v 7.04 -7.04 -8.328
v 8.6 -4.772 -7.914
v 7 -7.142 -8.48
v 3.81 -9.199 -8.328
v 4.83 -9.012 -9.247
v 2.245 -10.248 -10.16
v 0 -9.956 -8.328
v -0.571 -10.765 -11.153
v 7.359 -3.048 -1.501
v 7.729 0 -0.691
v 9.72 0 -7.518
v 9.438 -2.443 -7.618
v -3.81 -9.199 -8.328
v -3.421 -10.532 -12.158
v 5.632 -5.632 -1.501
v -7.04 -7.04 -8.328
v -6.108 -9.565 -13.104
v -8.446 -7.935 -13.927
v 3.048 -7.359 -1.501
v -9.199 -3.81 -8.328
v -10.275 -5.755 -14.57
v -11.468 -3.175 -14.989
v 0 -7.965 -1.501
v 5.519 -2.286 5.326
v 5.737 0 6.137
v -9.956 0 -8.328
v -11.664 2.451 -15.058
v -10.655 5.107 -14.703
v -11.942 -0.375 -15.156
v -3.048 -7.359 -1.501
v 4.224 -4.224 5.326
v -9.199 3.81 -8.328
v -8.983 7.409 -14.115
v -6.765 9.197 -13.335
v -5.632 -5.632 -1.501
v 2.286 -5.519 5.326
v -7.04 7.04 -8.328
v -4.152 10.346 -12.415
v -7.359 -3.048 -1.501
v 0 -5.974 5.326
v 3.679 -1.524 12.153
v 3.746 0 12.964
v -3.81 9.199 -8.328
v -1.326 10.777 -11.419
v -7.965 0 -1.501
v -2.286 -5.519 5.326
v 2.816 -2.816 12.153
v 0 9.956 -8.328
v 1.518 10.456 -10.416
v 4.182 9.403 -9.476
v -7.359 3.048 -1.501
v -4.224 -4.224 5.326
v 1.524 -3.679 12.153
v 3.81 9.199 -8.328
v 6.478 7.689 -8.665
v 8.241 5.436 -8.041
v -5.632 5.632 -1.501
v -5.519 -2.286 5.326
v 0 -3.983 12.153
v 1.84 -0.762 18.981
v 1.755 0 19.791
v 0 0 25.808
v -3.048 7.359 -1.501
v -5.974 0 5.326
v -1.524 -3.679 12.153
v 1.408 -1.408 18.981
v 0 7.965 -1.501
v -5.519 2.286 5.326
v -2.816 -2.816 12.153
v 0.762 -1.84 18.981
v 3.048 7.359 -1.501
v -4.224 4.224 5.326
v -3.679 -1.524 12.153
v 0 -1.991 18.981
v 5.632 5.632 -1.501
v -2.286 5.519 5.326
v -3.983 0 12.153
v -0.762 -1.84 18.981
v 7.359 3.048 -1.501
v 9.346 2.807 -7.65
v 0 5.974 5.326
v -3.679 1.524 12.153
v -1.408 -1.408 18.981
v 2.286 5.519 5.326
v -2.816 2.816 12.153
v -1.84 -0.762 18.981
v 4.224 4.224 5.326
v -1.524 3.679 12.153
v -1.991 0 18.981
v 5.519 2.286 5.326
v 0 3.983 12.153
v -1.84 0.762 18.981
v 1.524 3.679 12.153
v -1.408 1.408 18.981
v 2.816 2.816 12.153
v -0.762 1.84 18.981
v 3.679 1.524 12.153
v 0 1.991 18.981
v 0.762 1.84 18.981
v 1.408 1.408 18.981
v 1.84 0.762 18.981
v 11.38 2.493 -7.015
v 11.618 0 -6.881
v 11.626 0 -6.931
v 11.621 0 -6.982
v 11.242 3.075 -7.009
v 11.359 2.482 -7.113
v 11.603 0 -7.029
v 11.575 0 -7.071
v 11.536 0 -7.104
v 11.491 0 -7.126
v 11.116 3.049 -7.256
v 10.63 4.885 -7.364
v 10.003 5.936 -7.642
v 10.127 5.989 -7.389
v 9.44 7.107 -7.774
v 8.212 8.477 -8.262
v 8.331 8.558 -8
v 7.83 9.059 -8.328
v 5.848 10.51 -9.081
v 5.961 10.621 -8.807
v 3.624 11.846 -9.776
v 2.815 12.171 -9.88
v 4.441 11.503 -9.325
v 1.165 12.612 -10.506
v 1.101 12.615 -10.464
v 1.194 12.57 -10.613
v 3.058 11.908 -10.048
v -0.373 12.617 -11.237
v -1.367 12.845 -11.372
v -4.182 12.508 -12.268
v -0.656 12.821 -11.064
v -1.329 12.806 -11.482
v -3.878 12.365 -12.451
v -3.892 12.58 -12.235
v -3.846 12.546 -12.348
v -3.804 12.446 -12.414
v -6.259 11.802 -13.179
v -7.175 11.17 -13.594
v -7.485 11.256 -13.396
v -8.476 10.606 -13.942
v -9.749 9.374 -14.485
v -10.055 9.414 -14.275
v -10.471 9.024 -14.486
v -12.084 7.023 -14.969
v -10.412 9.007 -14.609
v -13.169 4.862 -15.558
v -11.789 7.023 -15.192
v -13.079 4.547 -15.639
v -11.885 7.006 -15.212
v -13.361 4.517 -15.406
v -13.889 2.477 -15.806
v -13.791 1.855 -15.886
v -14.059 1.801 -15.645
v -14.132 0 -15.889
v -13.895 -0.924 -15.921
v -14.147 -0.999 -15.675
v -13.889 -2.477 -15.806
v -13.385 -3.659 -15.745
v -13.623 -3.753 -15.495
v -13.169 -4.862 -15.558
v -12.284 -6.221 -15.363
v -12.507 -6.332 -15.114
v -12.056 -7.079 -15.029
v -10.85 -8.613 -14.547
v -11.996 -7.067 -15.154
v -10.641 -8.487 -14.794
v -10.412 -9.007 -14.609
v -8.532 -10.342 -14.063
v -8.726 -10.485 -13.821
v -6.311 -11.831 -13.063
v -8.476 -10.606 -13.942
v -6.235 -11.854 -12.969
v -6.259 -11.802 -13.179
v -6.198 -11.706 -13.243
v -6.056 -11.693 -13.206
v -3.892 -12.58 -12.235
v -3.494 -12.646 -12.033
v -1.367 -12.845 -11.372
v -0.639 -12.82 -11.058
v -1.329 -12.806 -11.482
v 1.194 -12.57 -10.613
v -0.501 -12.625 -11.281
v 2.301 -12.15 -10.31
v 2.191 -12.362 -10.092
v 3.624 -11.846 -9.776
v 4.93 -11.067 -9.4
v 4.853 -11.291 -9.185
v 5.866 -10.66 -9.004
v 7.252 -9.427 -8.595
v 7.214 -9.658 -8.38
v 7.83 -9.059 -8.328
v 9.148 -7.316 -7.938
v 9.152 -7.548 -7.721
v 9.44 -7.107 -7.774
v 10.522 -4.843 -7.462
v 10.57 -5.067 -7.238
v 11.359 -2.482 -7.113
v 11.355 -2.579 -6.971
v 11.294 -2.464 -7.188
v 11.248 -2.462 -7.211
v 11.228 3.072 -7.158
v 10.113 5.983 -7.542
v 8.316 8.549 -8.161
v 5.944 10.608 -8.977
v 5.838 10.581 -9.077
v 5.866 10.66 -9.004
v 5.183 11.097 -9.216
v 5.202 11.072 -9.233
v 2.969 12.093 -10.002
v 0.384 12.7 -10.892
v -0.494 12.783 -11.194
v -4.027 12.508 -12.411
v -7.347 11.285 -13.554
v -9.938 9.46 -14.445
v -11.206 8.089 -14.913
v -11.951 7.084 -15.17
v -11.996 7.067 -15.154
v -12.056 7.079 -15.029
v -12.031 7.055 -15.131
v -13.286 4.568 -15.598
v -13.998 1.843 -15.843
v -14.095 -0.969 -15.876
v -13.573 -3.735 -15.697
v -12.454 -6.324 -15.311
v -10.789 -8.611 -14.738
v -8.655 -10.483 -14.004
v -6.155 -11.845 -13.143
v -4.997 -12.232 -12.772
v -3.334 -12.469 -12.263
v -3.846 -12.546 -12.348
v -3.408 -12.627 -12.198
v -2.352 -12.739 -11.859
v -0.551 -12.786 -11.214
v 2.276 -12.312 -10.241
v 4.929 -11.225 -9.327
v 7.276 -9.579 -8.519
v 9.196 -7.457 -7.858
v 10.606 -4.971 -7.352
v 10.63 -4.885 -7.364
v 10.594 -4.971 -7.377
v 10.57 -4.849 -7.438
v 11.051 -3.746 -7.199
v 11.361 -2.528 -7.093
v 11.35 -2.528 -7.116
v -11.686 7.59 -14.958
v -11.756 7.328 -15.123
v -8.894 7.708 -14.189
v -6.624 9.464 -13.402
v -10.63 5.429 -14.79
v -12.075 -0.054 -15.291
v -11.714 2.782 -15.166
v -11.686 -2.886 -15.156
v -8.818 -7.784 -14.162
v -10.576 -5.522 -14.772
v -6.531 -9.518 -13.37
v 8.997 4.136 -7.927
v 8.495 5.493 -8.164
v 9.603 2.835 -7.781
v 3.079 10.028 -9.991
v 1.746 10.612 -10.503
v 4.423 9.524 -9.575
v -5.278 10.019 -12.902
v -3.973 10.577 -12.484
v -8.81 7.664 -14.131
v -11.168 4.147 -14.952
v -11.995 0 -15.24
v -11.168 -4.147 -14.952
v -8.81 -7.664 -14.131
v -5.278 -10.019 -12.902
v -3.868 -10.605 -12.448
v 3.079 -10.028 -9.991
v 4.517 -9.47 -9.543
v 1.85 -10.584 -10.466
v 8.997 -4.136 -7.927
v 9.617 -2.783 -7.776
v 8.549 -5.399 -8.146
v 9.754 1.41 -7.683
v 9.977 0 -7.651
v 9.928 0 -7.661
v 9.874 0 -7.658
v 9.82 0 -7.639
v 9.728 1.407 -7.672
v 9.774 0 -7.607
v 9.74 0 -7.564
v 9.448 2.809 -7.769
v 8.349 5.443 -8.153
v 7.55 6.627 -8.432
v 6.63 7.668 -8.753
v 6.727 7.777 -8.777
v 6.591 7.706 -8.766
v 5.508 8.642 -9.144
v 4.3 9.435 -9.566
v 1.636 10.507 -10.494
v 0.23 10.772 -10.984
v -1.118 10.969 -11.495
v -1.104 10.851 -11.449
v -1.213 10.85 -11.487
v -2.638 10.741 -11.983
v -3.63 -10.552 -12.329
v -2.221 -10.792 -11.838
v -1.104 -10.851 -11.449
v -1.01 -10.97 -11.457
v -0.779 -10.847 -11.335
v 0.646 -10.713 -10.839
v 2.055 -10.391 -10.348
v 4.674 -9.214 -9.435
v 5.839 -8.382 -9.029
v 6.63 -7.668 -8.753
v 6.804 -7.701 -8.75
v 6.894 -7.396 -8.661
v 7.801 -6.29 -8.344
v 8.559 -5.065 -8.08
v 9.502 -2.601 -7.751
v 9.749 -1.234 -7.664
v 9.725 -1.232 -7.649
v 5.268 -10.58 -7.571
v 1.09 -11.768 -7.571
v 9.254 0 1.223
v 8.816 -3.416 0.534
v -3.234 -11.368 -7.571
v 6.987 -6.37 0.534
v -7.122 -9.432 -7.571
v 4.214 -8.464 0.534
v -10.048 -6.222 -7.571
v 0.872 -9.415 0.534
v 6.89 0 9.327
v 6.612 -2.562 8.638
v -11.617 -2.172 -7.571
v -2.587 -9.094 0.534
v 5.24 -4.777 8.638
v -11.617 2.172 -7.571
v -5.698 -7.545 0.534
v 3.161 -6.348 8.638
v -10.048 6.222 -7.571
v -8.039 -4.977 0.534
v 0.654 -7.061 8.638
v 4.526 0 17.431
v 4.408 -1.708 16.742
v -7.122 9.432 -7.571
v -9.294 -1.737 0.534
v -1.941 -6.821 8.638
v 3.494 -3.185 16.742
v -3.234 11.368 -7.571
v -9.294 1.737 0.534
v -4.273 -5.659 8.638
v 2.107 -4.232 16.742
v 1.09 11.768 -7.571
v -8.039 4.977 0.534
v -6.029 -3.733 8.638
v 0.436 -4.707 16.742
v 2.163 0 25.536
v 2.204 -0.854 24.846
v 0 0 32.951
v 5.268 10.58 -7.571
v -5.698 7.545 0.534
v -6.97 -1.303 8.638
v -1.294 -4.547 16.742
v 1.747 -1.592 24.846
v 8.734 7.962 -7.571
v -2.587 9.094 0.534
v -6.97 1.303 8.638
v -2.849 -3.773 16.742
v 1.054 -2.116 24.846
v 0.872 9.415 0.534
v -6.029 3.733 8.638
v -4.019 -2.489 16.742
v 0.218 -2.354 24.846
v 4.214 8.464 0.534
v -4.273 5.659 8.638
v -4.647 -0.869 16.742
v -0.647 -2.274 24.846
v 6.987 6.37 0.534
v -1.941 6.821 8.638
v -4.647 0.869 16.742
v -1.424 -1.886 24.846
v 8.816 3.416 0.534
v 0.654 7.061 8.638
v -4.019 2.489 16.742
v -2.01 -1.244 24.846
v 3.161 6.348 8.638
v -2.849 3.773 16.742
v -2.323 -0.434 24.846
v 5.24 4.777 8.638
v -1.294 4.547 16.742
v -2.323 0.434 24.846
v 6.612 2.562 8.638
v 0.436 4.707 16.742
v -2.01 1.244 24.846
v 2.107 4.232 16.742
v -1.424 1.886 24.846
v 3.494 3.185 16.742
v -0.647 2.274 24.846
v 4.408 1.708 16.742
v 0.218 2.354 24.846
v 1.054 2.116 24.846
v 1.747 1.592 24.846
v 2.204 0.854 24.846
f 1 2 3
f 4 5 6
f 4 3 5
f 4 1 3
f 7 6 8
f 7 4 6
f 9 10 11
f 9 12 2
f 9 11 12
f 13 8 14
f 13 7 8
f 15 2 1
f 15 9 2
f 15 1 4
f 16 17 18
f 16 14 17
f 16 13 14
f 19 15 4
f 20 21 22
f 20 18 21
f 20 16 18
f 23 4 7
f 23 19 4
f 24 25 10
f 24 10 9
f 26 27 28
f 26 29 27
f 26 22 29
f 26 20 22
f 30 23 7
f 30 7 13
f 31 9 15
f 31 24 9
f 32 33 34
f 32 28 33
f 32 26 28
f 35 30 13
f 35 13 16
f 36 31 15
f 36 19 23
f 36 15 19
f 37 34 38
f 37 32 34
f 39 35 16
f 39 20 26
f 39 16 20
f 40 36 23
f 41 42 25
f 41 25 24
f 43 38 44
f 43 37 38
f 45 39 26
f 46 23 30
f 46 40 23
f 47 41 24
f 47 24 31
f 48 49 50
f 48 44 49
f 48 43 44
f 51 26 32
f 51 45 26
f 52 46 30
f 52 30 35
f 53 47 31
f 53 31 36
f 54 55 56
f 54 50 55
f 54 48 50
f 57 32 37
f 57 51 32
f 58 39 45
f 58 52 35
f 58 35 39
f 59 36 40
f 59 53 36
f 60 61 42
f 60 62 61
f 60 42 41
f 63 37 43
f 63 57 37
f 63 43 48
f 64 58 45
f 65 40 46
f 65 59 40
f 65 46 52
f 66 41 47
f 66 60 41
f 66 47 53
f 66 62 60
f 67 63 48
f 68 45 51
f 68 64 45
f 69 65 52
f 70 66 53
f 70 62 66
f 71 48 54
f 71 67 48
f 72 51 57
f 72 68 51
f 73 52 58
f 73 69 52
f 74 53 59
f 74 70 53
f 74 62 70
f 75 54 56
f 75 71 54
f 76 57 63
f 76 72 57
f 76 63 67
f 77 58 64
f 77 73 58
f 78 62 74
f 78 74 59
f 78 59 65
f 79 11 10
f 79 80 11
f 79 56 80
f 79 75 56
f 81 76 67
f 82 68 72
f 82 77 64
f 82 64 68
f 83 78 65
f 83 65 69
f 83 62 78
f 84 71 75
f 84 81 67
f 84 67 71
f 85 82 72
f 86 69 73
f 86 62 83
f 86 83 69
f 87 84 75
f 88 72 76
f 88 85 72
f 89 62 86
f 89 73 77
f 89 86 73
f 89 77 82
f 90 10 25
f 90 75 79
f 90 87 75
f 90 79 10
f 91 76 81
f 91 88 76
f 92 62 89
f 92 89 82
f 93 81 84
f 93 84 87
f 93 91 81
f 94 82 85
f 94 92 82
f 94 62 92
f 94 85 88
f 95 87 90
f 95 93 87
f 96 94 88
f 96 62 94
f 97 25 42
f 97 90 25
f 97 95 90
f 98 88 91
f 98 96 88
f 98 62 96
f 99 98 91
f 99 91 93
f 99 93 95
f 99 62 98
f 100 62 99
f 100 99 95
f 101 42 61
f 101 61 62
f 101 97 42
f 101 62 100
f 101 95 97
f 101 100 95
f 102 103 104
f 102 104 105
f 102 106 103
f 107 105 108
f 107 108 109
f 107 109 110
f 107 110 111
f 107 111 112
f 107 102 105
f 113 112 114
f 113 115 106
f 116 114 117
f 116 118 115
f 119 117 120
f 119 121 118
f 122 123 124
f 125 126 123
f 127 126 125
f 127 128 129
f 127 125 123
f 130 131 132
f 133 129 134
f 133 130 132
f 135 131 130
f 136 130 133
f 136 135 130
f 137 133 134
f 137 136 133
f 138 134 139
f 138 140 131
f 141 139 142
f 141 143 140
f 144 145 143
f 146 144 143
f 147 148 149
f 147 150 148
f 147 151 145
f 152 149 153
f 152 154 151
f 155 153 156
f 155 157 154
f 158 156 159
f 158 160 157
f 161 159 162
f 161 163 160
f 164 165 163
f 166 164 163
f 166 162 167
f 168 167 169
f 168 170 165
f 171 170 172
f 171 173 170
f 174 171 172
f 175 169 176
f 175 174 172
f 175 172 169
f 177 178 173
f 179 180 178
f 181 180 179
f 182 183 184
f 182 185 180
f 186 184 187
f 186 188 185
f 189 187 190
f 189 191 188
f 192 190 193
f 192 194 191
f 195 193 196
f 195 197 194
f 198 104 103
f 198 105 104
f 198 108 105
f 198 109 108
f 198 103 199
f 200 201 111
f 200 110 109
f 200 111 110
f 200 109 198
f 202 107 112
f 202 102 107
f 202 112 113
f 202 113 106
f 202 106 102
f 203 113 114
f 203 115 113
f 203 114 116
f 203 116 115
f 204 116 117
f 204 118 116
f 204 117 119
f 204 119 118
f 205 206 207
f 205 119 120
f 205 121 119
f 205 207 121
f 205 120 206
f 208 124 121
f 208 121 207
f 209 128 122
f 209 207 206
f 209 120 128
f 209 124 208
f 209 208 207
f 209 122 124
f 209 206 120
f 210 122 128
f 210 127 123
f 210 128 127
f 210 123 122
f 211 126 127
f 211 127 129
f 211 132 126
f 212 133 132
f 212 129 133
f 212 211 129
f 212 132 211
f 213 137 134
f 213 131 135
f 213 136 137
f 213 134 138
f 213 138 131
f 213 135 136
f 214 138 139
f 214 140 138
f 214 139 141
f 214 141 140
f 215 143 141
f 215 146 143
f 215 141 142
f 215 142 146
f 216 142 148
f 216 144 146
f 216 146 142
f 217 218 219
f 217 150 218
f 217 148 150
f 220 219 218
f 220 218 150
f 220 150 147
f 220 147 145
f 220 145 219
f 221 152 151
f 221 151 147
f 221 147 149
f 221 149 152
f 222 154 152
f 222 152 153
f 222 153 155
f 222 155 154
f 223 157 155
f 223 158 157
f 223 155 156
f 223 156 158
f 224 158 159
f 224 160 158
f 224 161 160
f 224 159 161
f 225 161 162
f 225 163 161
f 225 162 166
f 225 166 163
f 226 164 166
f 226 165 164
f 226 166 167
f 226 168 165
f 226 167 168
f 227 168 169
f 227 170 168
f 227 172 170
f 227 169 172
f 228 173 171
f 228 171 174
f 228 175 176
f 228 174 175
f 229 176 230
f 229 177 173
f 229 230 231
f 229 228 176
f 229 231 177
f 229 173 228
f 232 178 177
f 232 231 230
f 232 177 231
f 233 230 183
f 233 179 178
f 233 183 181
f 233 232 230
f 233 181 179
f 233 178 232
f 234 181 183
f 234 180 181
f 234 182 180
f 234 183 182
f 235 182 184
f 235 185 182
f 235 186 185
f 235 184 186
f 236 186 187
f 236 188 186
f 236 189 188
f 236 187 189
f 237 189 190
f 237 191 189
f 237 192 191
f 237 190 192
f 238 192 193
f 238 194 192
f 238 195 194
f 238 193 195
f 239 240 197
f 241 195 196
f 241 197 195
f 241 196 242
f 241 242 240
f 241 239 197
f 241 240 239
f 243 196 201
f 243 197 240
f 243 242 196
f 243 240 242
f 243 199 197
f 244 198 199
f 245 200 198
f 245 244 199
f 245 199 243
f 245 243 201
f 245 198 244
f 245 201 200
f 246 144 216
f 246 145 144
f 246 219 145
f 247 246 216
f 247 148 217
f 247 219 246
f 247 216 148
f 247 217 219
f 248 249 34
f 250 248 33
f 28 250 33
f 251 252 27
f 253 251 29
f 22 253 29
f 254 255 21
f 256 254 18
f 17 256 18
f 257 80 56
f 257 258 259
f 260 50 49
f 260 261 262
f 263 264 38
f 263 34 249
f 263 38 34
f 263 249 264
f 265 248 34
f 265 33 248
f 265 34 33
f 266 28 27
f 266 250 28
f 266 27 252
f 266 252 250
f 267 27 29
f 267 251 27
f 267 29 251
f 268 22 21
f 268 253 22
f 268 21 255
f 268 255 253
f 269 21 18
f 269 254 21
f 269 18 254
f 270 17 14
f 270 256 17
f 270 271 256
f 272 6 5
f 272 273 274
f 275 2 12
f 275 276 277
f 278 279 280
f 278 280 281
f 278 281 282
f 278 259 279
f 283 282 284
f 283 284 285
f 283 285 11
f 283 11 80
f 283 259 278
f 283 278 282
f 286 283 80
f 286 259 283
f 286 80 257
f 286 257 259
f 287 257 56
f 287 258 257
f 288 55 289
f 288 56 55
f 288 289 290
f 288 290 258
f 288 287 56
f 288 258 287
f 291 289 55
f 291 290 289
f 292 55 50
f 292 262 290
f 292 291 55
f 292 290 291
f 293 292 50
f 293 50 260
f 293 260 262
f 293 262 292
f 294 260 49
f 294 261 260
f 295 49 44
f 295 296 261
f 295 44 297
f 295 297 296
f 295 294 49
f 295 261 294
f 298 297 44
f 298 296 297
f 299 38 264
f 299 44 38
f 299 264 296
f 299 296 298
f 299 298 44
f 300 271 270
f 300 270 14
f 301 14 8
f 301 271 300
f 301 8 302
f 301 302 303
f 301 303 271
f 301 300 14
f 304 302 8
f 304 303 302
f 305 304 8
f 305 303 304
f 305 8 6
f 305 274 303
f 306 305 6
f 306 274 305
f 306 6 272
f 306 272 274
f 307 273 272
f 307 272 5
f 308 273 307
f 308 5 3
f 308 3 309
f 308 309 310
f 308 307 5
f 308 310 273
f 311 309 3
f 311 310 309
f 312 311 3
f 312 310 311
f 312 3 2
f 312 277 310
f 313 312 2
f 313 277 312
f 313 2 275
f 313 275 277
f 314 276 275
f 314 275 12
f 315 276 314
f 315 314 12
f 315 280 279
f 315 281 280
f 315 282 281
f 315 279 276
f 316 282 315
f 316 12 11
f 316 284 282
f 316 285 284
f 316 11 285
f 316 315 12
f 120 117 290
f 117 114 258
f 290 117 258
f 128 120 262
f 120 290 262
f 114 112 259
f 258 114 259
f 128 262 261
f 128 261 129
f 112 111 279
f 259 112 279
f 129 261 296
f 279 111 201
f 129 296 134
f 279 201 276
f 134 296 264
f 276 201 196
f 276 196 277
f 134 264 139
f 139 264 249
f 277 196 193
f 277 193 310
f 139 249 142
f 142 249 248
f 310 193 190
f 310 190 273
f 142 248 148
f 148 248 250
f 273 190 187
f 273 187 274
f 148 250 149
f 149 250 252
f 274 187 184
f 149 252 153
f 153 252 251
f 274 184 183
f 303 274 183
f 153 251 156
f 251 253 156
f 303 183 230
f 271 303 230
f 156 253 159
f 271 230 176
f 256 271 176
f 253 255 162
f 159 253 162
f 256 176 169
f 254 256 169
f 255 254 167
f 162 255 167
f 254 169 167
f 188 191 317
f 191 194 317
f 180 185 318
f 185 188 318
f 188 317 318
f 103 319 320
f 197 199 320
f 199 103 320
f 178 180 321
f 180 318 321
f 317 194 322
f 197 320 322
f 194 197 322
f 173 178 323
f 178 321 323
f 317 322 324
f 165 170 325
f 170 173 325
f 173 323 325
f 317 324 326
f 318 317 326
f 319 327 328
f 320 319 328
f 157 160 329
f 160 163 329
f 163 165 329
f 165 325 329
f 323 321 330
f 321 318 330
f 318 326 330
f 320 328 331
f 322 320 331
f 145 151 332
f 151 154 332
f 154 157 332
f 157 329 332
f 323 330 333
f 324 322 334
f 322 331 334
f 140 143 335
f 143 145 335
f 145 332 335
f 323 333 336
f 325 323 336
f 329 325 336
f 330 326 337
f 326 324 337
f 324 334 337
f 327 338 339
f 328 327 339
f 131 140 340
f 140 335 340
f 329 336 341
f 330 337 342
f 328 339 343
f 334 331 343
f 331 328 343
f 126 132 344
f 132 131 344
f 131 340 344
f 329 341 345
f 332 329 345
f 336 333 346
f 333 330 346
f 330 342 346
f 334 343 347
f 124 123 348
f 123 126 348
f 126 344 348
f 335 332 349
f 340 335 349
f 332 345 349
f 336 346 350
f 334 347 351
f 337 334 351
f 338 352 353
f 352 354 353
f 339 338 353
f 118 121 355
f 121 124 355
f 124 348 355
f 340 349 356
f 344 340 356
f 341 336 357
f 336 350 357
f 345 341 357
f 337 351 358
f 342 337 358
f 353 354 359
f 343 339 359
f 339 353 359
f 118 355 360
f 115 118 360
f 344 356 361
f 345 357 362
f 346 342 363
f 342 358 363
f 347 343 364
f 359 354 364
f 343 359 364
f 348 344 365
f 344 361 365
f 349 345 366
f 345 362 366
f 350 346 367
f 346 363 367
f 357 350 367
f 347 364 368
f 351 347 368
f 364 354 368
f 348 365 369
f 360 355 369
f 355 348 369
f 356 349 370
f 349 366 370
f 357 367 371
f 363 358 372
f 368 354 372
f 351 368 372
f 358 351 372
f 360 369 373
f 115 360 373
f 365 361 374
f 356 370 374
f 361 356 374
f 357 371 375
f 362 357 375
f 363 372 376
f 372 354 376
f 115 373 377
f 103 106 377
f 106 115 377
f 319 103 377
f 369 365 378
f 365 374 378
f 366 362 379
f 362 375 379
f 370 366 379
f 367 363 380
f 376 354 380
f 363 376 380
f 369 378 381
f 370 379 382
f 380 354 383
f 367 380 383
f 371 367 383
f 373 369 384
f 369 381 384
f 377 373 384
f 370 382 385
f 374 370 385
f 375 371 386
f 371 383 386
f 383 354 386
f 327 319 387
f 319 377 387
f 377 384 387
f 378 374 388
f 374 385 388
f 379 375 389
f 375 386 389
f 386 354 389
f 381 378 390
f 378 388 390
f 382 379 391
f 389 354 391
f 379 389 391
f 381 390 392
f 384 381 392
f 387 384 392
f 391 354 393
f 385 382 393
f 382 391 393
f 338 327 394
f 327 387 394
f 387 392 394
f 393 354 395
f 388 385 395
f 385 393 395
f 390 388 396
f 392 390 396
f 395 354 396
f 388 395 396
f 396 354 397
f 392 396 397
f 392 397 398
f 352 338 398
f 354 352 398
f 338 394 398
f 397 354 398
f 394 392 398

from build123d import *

# Parameters (mm, degrees)
F2_R     = 1.5
F5_DEPTH = 55.3
F6_T     = -2
F8_R     = 0.2


# Not quite as in the source:
# - a feature of the source that left no trace in its solid (it failed there, or was rolled back) is left out


with BuildPart() as f1:
    # F0 (on Front) → F1 (revolve)
    with BuildSketch(Plane.XZ):
        Polygon((0, 32.9506285489), (0, -27.0493714511), (17.5, -27.0493714511), align=None)
    revolve(axis=Axis((0, 0, 2.9506285489), (0, 0, -1)))

    # F2
    f2_edges = [f1.edges().sort_by_distance(p)[0] for p in [
        (-17.5, 0, -27.049371),
    ]]
    fillet(f2_edges, radius=F2_R)

    # F4 (on offset) → F5 (cut)
    with BuildSketch(Plane.XZ.offset(25)):
        Polygon((11.7434896529, -7.0389136672), (-14.4568033888, -16.1161629583), (-22.2343672067, -16.070589817), (-22.2343672067, -30.6586939842), (20.5961283824, -30.6586939842), (20.5961283824, -7.1517258466), align=None)
    extrude(amount=-F5_DEPTH, mode=Mode.SUBTRACT)

    # F6
    f6_openings = [f1.faces().sort_by_distance(p)[0] for p in [
        (-1.311914, 0, -11.562037),
    ]]
    offset(amount=F6_T, openings=f6_openings)

    # F8
    f8_edges = [f1.edges().sort_by_distance(p)[0] for p in [
        (-14.294775, 0, -16.060027),
        (-11.977257, 0, -15.257109),
    ]]
    fillet(f8_edges, radius=F8_R)


solid = f1.part
